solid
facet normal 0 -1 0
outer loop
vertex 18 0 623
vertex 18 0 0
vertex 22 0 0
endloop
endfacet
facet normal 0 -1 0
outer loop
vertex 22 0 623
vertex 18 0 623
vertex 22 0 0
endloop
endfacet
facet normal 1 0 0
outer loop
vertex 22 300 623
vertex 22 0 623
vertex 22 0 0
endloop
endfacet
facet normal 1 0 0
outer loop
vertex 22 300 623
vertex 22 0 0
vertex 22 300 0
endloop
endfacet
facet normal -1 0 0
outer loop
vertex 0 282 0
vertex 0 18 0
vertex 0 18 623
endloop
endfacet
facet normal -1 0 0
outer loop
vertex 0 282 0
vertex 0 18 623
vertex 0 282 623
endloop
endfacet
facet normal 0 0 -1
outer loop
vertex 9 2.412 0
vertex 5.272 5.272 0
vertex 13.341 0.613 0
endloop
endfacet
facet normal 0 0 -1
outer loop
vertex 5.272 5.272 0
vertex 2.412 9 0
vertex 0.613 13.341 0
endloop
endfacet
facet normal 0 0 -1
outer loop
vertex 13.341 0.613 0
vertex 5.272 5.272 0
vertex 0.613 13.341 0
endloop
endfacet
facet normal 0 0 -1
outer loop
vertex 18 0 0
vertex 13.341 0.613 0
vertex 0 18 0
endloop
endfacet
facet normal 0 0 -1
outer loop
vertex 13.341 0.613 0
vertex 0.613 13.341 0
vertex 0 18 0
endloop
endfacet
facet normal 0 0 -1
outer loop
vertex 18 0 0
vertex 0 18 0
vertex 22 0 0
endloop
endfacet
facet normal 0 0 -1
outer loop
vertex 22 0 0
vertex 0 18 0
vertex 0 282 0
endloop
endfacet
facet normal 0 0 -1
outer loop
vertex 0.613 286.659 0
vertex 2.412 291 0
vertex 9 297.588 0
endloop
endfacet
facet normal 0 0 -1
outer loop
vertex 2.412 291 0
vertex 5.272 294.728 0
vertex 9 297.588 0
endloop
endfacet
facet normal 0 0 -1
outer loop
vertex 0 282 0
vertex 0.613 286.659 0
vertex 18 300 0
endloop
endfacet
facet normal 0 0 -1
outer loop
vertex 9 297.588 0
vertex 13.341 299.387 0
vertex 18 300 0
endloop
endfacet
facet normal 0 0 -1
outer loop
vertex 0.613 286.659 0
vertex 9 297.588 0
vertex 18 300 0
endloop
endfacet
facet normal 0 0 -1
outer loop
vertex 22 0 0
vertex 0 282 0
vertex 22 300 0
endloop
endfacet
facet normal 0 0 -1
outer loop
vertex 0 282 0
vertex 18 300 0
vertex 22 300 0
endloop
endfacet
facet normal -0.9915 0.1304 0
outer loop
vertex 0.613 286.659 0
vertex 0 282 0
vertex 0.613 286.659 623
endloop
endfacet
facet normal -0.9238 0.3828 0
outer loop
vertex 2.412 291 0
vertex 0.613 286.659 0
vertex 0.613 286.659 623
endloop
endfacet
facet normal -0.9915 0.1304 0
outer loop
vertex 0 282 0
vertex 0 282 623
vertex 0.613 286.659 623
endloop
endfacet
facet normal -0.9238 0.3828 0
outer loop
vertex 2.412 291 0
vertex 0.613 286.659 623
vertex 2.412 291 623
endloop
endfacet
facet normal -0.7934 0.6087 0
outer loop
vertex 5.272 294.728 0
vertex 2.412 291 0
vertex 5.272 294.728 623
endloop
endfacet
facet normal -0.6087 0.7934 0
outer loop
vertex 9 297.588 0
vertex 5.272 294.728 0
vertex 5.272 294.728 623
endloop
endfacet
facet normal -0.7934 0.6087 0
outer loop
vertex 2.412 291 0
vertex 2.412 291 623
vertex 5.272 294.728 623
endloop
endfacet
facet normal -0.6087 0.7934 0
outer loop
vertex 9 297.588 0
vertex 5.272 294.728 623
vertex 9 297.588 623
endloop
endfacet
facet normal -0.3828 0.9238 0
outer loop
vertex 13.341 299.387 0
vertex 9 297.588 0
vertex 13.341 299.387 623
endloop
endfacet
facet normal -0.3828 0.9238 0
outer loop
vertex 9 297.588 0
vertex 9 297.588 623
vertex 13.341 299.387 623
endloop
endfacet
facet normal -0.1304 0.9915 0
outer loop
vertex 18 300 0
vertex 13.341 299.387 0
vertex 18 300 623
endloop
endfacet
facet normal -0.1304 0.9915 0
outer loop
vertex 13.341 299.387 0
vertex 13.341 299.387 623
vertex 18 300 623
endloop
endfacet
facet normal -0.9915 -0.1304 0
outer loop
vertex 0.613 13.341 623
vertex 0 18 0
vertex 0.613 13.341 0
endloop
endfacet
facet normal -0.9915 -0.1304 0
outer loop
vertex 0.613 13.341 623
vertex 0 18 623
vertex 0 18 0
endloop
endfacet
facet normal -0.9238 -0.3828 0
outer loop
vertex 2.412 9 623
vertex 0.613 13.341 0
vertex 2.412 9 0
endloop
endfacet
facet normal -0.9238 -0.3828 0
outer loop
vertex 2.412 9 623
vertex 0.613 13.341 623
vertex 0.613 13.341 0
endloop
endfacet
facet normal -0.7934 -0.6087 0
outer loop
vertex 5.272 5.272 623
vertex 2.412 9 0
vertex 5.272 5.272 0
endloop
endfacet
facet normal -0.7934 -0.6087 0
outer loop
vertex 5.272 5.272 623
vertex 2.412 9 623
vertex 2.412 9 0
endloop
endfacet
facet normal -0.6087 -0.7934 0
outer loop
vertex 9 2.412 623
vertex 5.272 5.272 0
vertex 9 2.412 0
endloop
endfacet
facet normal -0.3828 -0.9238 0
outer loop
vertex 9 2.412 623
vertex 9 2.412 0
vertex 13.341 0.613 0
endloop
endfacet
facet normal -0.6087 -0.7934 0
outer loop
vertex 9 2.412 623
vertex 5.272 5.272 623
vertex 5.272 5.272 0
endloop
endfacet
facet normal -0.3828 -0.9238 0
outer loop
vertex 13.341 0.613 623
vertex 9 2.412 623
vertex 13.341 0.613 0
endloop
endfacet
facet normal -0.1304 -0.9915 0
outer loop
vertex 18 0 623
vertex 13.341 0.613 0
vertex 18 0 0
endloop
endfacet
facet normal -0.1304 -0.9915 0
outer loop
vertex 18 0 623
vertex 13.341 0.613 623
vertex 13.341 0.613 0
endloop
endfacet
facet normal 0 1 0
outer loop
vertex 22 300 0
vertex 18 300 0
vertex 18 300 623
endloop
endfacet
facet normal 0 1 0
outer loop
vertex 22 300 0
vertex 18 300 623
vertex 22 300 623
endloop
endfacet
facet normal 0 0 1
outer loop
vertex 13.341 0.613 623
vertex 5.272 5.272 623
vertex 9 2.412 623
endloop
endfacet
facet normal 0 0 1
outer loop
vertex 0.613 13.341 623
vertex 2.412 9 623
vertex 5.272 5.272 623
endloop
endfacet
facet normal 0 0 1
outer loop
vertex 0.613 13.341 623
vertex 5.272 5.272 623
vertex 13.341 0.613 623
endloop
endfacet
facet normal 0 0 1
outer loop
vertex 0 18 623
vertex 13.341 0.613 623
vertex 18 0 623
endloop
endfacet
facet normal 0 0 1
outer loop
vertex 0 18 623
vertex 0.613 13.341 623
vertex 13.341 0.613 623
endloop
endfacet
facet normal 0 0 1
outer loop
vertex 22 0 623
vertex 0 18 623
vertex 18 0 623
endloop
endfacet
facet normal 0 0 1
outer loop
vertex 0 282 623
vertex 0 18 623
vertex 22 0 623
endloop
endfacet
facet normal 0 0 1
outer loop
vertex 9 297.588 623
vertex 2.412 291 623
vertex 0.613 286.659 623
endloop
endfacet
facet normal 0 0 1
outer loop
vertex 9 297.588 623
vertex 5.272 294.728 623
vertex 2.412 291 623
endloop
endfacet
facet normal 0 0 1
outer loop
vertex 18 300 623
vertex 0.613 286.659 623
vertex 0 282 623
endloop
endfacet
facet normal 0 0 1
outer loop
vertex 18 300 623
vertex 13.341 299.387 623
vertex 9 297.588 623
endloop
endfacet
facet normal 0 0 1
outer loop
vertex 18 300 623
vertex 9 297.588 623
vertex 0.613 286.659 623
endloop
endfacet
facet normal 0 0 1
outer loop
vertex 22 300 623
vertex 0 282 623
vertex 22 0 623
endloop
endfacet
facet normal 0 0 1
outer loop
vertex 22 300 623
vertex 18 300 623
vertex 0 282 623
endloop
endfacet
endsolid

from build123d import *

# Parameters (mm, degrees)
BOX_W       = 22
BOX_H       = 300
BOX_DEPTH   = 623
FILLET_R    = 18
FILLET001_R = 18


with BuildPart() as part:
    # Box → Box (new body)
    with BuildSketch(Plane.XY):
        with Locations((11, 150)):
            Rectangle(BOX_W, BOX_H)
    extrude(amount=BOX_DEPTH)

    # Fillet
    fillet_edges = [part.edges().sort_by_distance(p)[0] for p in [
        (0, 0, 311.5),
    ]]
    fillet(fillet_edges, radius=FILLET_R)

    # Fillet001
    fillet001_edges = [part.edges().sort_by_distance(p)[0] for p in [
        (0, 300, 311.5),
    ]]
    fillet(fillet001_edges, radius=FILLET001_R)


solid = part.part
